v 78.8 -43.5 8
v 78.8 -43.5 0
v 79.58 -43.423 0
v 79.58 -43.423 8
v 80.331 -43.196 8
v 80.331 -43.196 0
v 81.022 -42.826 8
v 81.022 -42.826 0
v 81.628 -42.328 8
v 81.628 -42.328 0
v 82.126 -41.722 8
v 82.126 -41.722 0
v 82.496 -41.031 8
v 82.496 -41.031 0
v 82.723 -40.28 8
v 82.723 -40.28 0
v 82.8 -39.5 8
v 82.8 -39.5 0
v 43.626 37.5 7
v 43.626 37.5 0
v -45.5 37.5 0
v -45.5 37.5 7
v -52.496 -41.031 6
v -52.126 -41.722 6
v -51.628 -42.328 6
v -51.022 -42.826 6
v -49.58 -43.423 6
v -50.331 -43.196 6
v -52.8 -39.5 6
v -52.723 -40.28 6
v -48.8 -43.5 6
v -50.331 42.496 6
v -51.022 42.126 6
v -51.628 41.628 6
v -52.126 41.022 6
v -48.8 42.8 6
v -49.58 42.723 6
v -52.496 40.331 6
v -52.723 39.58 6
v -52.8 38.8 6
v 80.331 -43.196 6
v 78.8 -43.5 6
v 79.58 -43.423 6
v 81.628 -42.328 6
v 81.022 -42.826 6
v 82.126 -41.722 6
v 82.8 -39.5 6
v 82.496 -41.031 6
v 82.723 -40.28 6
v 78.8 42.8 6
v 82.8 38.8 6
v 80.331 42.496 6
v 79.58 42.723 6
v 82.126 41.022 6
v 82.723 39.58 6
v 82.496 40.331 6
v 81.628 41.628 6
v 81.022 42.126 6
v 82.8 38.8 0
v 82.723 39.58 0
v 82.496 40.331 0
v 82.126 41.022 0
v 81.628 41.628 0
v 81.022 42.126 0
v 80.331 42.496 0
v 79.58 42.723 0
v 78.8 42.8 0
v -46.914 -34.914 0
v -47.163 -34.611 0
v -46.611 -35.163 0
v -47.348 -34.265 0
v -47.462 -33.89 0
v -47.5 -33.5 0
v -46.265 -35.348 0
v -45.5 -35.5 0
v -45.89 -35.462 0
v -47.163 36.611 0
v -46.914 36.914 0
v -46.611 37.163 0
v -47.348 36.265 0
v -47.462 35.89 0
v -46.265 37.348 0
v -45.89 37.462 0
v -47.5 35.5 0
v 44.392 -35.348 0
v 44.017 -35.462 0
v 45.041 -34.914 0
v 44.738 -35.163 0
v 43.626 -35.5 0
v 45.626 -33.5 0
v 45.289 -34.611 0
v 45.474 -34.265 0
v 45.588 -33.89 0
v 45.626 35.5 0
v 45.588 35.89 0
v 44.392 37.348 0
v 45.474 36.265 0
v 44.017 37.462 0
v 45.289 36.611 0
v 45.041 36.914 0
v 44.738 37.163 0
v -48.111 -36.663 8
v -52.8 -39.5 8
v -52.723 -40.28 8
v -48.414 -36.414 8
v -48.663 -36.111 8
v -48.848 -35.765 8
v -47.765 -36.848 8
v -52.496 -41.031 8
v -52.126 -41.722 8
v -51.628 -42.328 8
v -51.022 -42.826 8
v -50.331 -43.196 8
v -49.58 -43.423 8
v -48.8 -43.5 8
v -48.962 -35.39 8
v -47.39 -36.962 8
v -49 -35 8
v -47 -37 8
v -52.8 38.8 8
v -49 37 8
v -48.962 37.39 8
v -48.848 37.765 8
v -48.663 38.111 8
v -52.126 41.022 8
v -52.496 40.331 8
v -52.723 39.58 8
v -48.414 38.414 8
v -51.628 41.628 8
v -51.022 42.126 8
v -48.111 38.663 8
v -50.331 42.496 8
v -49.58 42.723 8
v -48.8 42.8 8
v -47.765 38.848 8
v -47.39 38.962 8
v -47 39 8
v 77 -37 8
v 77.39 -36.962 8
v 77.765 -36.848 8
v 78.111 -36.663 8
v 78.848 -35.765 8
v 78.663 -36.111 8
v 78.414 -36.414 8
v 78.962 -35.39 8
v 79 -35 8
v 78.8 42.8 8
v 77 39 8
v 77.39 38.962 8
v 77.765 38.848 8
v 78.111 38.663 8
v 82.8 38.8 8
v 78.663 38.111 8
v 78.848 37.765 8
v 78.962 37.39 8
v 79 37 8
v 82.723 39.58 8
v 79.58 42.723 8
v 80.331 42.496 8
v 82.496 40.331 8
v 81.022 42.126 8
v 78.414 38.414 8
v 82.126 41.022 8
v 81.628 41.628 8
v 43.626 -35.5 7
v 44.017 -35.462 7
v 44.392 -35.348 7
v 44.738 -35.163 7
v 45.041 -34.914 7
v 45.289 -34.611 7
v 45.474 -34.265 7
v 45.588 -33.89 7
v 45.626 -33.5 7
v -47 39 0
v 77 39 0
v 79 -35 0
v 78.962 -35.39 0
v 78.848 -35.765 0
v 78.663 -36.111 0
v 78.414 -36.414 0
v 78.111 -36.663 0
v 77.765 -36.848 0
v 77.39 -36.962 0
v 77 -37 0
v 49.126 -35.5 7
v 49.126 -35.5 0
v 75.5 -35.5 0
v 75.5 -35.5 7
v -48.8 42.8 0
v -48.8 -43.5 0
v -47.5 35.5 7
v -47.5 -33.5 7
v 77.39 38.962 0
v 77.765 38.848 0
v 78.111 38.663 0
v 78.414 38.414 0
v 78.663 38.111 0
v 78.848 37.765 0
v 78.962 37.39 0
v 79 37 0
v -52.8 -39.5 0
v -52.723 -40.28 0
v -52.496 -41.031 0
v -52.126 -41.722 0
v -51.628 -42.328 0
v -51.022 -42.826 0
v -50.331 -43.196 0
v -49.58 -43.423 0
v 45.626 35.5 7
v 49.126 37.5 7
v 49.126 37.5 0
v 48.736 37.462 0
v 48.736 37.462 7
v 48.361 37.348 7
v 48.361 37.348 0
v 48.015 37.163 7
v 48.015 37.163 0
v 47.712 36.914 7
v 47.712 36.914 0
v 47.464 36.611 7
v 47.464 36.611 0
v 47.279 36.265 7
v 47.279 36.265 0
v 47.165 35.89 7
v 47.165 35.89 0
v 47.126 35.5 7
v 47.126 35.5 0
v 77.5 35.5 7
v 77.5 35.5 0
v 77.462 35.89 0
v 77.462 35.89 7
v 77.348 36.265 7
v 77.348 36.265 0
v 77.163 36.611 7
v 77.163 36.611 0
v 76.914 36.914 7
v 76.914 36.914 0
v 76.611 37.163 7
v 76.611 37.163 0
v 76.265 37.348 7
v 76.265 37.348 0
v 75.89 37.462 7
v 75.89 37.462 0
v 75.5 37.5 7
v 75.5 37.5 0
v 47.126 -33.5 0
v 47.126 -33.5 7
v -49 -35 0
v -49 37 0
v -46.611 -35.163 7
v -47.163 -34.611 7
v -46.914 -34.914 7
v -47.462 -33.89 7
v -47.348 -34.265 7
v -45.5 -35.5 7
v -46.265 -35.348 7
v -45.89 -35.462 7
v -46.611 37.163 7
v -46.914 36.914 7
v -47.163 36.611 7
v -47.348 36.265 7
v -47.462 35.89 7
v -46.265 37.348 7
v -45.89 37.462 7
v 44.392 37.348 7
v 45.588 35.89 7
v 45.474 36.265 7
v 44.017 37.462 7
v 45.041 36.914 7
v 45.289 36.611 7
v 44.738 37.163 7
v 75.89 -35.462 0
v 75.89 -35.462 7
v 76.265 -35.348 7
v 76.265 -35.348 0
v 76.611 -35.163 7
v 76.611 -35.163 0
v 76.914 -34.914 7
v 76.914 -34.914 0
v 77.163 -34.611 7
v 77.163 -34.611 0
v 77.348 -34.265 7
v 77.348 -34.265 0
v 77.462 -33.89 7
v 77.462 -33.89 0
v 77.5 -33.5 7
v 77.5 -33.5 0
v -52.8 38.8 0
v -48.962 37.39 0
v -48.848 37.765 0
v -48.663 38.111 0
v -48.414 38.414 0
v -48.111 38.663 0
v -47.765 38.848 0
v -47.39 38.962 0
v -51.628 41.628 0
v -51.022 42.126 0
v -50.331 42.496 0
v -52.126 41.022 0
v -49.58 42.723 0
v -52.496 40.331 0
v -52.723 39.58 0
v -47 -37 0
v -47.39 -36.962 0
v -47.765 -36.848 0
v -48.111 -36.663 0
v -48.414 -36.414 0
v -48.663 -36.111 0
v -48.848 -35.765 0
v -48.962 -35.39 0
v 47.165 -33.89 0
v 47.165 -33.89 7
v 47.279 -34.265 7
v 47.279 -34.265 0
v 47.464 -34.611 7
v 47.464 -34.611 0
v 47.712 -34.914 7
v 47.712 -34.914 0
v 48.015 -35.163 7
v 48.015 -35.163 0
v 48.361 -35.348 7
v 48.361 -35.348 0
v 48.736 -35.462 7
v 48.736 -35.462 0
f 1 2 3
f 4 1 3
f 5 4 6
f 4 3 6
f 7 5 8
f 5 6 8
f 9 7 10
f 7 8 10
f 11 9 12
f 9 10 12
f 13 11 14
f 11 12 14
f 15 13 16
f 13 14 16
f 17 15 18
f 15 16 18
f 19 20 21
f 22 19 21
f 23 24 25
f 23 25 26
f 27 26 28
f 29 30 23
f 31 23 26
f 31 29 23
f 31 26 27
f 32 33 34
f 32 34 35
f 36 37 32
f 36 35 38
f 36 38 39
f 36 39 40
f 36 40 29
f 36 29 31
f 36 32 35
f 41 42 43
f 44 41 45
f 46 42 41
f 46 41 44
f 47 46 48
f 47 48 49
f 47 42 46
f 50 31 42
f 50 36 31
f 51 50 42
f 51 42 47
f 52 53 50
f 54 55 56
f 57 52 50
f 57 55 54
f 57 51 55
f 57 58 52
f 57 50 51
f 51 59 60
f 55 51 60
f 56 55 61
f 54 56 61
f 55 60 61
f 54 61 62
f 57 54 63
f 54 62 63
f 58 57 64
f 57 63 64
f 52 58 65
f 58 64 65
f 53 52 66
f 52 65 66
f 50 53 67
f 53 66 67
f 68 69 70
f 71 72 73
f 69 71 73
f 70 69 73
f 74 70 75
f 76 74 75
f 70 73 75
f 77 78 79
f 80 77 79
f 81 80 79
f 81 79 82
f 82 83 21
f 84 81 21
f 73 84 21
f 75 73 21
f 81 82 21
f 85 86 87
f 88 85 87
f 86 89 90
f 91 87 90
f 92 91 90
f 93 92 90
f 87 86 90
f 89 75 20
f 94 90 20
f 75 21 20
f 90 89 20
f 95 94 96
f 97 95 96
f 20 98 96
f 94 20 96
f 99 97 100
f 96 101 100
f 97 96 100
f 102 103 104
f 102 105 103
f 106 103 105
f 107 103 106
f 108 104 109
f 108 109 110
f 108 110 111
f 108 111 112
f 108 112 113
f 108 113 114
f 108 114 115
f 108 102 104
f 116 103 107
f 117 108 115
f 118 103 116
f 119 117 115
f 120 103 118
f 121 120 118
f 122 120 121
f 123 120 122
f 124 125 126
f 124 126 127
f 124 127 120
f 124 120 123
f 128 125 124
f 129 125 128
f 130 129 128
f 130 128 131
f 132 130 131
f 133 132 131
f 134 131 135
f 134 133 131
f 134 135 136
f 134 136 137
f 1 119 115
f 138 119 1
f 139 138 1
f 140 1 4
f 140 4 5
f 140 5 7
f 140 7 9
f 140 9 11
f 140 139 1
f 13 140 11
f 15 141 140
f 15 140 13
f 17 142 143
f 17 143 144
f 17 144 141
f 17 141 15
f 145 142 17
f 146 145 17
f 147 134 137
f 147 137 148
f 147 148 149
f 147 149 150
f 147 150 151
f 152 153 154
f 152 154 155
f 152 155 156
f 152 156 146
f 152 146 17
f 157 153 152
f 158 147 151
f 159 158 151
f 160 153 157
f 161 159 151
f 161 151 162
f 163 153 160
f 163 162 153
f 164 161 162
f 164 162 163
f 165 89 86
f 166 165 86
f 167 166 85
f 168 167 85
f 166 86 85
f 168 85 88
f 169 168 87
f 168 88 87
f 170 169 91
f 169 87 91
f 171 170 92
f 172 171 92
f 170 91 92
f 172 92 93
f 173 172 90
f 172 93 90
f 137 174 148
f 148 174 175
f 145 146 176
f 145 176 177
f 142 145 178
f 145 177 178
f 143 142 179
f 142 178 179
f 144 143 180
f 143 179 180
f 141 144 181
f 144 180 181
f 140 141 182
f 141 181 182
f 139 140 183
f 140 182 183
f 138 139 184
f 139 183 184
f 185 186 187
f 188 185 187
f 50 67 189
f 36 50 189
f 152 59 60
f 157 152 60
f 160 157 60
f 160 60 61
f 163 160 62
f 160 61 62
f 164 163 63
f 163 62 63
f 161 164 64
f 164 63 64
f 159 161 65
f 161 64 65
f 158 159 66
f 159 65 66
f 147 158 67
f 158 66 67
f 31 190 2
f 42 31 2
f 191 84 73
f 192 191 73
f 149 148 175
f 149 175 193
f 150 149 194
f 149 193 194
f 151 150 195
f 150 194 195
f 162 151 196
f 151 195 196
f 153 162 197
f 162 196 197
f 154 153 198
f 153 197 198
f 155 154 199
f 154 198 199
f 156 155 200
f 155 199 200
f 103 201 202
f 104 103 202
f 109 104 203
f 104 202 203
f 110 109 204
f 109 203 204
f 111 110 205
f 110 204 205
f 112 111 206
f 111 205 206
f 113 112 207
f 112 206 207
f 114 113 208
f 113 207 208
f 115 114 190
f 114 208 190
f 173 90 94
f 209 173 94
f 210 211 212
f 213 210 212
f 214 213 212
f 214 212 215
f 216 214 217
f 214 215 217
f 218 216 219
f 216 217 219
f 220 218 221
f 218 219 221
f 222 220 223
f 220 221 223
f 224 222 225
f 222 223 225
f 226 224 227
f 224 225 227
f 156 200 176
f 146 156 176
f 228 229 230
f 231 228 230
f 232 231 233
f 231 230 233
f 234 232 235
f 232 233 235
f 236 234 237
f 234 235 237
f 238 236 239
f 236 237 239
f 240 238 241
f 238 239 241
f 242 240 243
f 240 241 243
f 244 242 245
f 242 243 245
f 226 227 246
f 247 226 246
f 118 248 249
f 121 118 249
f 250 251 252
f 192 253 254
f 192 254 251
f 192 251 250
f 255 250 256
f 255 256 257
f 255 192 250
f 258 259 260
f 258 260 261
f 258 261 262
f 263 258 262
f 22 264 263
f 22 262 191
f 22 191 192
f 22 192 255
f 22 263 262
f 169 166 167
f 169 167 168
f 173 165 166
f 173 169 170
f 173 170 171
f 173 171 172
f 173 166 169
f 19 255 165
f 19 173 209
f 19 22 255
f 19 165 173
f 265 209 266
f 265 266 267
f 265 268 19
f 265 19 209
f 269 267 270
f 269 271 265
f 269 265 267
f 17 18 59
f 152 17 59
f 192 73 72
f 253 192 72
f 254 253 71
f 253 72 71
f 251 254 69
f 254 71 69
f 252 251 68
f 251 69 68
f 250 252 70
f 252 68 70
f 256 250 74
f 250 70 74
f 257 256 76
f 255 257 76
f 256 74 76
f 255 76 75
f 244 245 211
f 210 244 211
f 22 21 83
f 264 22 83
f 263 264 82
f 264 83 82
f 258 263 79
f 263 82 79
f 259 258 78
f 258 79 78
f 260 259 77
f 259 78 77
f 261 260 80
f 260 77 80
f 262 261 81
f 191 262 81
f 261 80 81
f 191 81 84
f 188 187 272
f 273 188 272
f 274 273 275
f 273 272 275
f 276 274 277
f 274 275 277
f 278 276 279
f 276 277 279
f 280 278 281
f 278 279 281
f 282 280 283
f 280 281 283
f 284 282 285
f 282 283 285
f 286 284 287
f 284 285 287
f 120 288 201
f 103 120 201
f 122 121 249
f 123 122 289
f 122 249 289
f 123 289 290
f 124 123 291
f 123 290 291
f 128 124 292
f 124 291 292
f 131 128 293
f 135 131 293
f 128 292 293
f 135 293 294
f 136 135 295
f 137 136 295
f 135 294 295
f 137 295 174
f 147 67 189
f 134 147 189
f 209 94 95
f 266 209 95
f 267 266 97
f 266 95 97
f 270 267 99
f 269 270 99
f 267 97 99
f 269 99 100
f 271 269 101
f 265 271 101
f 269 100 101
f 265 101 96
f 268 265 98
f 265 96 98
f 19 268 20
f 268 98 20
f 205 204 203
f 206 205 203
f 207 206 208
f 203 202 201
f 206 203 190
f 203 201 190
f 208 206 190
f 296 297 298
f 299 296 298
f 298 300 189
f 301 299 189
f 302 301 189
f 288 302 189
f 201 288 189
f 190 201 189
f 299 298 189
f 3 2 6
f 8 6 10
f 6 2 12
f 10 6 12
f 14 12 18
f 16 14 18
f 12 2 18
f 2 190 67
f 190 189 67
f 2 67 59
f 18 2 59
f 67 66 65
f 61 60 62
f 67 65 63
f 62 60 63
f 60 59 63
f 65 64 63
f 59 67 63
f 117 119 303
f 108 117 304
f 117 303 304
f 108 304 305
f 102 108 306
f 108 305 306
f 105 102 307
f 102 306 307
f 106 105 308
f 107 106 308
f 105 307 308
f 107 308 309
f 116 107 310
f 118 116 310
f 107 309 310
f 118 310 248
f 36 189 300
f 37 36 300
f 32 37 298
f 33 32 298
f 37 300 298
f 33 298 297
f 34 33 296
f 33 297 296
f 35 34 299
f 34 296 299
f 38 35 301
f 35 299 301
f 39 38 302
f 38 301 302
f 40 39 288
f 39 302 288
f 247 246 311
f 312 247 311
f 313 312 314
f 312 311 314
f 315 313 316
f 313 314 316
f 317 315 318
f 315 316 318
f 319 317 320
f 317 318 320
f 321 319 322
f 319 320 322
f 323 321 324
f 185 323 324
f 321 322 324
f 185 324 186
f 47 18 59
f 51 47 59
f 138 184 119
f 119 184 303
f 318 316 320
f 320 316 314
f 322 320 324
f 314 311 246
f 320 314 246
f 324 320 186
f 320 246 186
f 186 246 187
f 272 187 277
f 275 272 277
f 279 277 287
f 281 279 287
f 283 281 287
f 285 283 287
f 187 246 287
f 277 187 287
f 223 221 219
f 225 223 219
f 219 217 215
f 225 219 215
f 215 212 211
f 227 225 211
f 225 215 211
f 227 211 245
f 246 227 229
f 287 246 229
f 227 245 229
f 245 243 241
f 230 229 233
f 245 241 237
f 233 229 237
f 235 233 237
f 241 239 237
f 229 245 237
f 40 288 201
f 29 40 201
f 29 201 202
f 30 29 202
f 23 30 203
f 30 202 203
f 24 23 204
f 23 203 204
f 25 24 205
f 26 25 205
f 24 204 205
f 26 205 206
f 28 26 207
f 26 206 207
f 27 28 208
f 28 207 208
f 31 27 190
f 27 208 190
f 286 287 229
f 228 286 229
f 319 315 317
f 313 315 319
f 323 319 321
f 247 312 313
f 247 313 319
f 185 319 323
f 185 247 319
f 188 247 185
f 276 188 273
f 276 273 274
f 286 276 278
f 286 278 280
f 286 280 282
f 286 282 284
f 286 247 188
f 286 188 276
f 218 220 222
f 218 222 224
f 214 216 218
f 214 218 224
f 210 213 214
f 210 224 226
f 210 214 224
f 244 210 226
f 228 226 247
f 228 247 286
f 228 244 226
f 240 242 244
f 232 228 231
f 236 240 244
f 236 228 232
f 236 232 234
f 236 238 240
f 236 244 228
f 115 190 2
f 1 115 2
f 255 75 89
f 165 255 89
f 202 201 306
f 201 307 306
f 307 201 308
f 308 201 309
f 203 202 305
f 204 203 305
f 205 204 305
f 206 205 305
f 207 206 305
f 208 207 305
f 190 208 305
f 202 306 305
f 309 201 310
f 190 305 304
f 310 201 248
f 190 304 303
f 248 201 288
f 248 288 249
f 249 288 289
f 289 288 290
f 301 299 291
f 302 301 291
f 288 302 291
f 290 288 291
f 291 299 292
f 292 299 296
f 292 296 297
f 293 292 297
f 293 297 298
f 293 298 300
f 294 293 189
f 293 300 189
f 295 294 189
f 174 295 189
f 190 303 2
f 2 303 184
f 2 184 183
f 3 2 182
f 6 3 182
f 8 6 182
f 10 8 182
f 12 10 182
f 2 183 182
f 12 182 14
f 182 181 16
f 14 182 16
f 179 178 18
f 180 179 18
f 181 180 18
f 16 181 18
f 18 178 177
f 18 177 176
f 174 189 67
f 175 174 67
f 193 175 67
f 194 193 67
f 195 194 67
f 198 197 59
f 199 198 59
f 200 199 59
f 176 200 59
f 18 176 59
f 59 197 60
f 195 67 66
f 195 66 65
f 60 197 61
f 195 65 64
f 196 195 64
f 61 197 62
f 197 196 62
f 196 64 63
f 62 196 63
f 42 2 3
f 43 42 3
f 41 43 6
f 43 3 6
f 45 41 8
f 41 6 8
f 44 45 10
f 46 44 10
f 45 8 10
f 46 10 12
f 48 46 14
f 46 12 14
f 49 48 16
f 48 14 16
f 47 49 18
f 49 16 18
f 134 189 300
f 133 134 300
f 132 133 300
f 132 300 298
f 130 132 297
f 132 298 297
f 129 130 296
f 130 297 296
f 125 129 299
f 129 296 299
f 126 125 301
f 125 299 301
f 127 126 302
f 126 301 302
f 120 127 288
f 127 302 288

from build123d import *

# Parameters (mm, degrees)
F1_DEPTH = 8
F3_DEPTH = 7
F5_DEPTH = 6


with BuildPart() as f1:
    # F0 (on Top) → F1 (new body)
    with BuildSketch(Plane.XY):
        with BuildLine():
            Line((78.8, 42.8), (-48.8, 42.8))
            ThreePointArc((-48.8, 42.8), (-51.628427, 41.628427), (-52.8, 38.8))
            Line((-52.8, 38.8), (-52.8, -39.5))
            ThreePointArc((-52.8, -39.5), (-51.628427, -42.328427), (-48.8, -43.5))
            Line((-48.8, -43.5), (78.8, -43.5))
            ThreePointArc((78.8, -43.5), (81.628427, -42.328427), (82.8, -39.5))
            Line((82.8, -39.5), (82.8, 38.8))
            ThreePointArc((82.8, 38.8), (81.628427, 41.628427), (78.8, 42.8))
        make_face()
        with BuildLine():
            Line((-47, 39), (77, 39))
            ThreePointArc((77, 39), (78.414214, 38.414214), (79, 37))
            Line((79, 37), (79, -35))
            ThreePointArc((79, -35), (78.414214, -36.414214), (77, -37))
            Line((77, -37), (-47, -37))
            ThreePointArc((-47, -37), (-48.414214, -36.414214), (-49, -35))
            Line((-49, -35), (-49, 37))
            ThreePointArc((-49, 37), (-48.414214, 38.414214), (-47, 39))
        make_face(mode=Mode.SUBTRACT)
    extrude(amount=F1_DEPTH)


with BuildPart() as f3:
    # F2 (on Top) → F3 (new body)
    with BuildSketch(Plane.XY):
        with BuildLine():
            ThreePointArc((45.626484, 35.5), (45.040697, 36.914214), (43.626484, 37.5))
            Line((43.626484, 37.5), (-45.5, 37.5))
            ThreePointArc((-45.5, 37.5), (-46.914214, 36.914214), (-47.5, 35.5))
            Line((-47.5, 35.5), (-47.5, -33.5))
            ThreePointArc((-47.5, -33.5), (-46.914214, -34.914214), (-45.5, -35.5))
            Line((-45.5, -35.5), (43.626484, -35.5))
            ThreePointArc((43.626484, -35.5), (45.040697, -34.914214), (45.626484, -33.5))
            Line((45.626484, -33.5), (45.626484, 35.5))
        make_face()
        with BuildLine():
            Line((75.5, 37.5), (49.126484, 37.5))
            ThreePointArc((49.126484, 37.5), (47.71227, 36.914214), (47.126484, 35.5))
            Line((47.126484, 35.5), (47.126484, -33.5))
            ThreePointArc((47.126484, -33.5), (47.71227, -34.914214), (49.126484, -35.5))
            Line((49.126484, -35.5), (75.5, -35.5))
            ThreePointArc((75.5, -35.5), (76.914214, -34.914214), (77.5, -33.5))
            Line((77.5, -33.5), (77.5, 35.5))
            ThreePointArc((77.5, 35.5), (76.914214, 36.914214), (75.5, 37.5))
        make_face()
    extrude(amount=F3_DEPTH)


with BuildPart() as f5:
    # F4 (on Top) → F5 (new body)
    with BuildSketch(Plane.XY):
        with BuildLine():
            Line((78.8, 42.8), (-48.8, 42.8))
            ThreePointArc((-48.8, 42.8), (-51.628427, 41.628427), (-52.8, 38.8))
            Line((-52.8, 38.8), (-52.8, -39.5))
            ThreePointArc((-52.8, -39.5), (-51.628427, -42.328427), (-48.8, -43.5))
            Line((-48.8, -43.5), (78.8, -43.5))
            ThreePointArc((78.8, -43.5), (81.628427, -42.328427), (82.8, -39.5))
            Line((82.8, -39.5), (82.8, 38.8))
            ThreePointArc((82.8, 38.8), (81.628427, 41.628427), (78.8, 42.8))
        make_face()
    extrude(amount=F5_DEPTH)


solid = Compound([f1.part, f3.part, f5.part])
